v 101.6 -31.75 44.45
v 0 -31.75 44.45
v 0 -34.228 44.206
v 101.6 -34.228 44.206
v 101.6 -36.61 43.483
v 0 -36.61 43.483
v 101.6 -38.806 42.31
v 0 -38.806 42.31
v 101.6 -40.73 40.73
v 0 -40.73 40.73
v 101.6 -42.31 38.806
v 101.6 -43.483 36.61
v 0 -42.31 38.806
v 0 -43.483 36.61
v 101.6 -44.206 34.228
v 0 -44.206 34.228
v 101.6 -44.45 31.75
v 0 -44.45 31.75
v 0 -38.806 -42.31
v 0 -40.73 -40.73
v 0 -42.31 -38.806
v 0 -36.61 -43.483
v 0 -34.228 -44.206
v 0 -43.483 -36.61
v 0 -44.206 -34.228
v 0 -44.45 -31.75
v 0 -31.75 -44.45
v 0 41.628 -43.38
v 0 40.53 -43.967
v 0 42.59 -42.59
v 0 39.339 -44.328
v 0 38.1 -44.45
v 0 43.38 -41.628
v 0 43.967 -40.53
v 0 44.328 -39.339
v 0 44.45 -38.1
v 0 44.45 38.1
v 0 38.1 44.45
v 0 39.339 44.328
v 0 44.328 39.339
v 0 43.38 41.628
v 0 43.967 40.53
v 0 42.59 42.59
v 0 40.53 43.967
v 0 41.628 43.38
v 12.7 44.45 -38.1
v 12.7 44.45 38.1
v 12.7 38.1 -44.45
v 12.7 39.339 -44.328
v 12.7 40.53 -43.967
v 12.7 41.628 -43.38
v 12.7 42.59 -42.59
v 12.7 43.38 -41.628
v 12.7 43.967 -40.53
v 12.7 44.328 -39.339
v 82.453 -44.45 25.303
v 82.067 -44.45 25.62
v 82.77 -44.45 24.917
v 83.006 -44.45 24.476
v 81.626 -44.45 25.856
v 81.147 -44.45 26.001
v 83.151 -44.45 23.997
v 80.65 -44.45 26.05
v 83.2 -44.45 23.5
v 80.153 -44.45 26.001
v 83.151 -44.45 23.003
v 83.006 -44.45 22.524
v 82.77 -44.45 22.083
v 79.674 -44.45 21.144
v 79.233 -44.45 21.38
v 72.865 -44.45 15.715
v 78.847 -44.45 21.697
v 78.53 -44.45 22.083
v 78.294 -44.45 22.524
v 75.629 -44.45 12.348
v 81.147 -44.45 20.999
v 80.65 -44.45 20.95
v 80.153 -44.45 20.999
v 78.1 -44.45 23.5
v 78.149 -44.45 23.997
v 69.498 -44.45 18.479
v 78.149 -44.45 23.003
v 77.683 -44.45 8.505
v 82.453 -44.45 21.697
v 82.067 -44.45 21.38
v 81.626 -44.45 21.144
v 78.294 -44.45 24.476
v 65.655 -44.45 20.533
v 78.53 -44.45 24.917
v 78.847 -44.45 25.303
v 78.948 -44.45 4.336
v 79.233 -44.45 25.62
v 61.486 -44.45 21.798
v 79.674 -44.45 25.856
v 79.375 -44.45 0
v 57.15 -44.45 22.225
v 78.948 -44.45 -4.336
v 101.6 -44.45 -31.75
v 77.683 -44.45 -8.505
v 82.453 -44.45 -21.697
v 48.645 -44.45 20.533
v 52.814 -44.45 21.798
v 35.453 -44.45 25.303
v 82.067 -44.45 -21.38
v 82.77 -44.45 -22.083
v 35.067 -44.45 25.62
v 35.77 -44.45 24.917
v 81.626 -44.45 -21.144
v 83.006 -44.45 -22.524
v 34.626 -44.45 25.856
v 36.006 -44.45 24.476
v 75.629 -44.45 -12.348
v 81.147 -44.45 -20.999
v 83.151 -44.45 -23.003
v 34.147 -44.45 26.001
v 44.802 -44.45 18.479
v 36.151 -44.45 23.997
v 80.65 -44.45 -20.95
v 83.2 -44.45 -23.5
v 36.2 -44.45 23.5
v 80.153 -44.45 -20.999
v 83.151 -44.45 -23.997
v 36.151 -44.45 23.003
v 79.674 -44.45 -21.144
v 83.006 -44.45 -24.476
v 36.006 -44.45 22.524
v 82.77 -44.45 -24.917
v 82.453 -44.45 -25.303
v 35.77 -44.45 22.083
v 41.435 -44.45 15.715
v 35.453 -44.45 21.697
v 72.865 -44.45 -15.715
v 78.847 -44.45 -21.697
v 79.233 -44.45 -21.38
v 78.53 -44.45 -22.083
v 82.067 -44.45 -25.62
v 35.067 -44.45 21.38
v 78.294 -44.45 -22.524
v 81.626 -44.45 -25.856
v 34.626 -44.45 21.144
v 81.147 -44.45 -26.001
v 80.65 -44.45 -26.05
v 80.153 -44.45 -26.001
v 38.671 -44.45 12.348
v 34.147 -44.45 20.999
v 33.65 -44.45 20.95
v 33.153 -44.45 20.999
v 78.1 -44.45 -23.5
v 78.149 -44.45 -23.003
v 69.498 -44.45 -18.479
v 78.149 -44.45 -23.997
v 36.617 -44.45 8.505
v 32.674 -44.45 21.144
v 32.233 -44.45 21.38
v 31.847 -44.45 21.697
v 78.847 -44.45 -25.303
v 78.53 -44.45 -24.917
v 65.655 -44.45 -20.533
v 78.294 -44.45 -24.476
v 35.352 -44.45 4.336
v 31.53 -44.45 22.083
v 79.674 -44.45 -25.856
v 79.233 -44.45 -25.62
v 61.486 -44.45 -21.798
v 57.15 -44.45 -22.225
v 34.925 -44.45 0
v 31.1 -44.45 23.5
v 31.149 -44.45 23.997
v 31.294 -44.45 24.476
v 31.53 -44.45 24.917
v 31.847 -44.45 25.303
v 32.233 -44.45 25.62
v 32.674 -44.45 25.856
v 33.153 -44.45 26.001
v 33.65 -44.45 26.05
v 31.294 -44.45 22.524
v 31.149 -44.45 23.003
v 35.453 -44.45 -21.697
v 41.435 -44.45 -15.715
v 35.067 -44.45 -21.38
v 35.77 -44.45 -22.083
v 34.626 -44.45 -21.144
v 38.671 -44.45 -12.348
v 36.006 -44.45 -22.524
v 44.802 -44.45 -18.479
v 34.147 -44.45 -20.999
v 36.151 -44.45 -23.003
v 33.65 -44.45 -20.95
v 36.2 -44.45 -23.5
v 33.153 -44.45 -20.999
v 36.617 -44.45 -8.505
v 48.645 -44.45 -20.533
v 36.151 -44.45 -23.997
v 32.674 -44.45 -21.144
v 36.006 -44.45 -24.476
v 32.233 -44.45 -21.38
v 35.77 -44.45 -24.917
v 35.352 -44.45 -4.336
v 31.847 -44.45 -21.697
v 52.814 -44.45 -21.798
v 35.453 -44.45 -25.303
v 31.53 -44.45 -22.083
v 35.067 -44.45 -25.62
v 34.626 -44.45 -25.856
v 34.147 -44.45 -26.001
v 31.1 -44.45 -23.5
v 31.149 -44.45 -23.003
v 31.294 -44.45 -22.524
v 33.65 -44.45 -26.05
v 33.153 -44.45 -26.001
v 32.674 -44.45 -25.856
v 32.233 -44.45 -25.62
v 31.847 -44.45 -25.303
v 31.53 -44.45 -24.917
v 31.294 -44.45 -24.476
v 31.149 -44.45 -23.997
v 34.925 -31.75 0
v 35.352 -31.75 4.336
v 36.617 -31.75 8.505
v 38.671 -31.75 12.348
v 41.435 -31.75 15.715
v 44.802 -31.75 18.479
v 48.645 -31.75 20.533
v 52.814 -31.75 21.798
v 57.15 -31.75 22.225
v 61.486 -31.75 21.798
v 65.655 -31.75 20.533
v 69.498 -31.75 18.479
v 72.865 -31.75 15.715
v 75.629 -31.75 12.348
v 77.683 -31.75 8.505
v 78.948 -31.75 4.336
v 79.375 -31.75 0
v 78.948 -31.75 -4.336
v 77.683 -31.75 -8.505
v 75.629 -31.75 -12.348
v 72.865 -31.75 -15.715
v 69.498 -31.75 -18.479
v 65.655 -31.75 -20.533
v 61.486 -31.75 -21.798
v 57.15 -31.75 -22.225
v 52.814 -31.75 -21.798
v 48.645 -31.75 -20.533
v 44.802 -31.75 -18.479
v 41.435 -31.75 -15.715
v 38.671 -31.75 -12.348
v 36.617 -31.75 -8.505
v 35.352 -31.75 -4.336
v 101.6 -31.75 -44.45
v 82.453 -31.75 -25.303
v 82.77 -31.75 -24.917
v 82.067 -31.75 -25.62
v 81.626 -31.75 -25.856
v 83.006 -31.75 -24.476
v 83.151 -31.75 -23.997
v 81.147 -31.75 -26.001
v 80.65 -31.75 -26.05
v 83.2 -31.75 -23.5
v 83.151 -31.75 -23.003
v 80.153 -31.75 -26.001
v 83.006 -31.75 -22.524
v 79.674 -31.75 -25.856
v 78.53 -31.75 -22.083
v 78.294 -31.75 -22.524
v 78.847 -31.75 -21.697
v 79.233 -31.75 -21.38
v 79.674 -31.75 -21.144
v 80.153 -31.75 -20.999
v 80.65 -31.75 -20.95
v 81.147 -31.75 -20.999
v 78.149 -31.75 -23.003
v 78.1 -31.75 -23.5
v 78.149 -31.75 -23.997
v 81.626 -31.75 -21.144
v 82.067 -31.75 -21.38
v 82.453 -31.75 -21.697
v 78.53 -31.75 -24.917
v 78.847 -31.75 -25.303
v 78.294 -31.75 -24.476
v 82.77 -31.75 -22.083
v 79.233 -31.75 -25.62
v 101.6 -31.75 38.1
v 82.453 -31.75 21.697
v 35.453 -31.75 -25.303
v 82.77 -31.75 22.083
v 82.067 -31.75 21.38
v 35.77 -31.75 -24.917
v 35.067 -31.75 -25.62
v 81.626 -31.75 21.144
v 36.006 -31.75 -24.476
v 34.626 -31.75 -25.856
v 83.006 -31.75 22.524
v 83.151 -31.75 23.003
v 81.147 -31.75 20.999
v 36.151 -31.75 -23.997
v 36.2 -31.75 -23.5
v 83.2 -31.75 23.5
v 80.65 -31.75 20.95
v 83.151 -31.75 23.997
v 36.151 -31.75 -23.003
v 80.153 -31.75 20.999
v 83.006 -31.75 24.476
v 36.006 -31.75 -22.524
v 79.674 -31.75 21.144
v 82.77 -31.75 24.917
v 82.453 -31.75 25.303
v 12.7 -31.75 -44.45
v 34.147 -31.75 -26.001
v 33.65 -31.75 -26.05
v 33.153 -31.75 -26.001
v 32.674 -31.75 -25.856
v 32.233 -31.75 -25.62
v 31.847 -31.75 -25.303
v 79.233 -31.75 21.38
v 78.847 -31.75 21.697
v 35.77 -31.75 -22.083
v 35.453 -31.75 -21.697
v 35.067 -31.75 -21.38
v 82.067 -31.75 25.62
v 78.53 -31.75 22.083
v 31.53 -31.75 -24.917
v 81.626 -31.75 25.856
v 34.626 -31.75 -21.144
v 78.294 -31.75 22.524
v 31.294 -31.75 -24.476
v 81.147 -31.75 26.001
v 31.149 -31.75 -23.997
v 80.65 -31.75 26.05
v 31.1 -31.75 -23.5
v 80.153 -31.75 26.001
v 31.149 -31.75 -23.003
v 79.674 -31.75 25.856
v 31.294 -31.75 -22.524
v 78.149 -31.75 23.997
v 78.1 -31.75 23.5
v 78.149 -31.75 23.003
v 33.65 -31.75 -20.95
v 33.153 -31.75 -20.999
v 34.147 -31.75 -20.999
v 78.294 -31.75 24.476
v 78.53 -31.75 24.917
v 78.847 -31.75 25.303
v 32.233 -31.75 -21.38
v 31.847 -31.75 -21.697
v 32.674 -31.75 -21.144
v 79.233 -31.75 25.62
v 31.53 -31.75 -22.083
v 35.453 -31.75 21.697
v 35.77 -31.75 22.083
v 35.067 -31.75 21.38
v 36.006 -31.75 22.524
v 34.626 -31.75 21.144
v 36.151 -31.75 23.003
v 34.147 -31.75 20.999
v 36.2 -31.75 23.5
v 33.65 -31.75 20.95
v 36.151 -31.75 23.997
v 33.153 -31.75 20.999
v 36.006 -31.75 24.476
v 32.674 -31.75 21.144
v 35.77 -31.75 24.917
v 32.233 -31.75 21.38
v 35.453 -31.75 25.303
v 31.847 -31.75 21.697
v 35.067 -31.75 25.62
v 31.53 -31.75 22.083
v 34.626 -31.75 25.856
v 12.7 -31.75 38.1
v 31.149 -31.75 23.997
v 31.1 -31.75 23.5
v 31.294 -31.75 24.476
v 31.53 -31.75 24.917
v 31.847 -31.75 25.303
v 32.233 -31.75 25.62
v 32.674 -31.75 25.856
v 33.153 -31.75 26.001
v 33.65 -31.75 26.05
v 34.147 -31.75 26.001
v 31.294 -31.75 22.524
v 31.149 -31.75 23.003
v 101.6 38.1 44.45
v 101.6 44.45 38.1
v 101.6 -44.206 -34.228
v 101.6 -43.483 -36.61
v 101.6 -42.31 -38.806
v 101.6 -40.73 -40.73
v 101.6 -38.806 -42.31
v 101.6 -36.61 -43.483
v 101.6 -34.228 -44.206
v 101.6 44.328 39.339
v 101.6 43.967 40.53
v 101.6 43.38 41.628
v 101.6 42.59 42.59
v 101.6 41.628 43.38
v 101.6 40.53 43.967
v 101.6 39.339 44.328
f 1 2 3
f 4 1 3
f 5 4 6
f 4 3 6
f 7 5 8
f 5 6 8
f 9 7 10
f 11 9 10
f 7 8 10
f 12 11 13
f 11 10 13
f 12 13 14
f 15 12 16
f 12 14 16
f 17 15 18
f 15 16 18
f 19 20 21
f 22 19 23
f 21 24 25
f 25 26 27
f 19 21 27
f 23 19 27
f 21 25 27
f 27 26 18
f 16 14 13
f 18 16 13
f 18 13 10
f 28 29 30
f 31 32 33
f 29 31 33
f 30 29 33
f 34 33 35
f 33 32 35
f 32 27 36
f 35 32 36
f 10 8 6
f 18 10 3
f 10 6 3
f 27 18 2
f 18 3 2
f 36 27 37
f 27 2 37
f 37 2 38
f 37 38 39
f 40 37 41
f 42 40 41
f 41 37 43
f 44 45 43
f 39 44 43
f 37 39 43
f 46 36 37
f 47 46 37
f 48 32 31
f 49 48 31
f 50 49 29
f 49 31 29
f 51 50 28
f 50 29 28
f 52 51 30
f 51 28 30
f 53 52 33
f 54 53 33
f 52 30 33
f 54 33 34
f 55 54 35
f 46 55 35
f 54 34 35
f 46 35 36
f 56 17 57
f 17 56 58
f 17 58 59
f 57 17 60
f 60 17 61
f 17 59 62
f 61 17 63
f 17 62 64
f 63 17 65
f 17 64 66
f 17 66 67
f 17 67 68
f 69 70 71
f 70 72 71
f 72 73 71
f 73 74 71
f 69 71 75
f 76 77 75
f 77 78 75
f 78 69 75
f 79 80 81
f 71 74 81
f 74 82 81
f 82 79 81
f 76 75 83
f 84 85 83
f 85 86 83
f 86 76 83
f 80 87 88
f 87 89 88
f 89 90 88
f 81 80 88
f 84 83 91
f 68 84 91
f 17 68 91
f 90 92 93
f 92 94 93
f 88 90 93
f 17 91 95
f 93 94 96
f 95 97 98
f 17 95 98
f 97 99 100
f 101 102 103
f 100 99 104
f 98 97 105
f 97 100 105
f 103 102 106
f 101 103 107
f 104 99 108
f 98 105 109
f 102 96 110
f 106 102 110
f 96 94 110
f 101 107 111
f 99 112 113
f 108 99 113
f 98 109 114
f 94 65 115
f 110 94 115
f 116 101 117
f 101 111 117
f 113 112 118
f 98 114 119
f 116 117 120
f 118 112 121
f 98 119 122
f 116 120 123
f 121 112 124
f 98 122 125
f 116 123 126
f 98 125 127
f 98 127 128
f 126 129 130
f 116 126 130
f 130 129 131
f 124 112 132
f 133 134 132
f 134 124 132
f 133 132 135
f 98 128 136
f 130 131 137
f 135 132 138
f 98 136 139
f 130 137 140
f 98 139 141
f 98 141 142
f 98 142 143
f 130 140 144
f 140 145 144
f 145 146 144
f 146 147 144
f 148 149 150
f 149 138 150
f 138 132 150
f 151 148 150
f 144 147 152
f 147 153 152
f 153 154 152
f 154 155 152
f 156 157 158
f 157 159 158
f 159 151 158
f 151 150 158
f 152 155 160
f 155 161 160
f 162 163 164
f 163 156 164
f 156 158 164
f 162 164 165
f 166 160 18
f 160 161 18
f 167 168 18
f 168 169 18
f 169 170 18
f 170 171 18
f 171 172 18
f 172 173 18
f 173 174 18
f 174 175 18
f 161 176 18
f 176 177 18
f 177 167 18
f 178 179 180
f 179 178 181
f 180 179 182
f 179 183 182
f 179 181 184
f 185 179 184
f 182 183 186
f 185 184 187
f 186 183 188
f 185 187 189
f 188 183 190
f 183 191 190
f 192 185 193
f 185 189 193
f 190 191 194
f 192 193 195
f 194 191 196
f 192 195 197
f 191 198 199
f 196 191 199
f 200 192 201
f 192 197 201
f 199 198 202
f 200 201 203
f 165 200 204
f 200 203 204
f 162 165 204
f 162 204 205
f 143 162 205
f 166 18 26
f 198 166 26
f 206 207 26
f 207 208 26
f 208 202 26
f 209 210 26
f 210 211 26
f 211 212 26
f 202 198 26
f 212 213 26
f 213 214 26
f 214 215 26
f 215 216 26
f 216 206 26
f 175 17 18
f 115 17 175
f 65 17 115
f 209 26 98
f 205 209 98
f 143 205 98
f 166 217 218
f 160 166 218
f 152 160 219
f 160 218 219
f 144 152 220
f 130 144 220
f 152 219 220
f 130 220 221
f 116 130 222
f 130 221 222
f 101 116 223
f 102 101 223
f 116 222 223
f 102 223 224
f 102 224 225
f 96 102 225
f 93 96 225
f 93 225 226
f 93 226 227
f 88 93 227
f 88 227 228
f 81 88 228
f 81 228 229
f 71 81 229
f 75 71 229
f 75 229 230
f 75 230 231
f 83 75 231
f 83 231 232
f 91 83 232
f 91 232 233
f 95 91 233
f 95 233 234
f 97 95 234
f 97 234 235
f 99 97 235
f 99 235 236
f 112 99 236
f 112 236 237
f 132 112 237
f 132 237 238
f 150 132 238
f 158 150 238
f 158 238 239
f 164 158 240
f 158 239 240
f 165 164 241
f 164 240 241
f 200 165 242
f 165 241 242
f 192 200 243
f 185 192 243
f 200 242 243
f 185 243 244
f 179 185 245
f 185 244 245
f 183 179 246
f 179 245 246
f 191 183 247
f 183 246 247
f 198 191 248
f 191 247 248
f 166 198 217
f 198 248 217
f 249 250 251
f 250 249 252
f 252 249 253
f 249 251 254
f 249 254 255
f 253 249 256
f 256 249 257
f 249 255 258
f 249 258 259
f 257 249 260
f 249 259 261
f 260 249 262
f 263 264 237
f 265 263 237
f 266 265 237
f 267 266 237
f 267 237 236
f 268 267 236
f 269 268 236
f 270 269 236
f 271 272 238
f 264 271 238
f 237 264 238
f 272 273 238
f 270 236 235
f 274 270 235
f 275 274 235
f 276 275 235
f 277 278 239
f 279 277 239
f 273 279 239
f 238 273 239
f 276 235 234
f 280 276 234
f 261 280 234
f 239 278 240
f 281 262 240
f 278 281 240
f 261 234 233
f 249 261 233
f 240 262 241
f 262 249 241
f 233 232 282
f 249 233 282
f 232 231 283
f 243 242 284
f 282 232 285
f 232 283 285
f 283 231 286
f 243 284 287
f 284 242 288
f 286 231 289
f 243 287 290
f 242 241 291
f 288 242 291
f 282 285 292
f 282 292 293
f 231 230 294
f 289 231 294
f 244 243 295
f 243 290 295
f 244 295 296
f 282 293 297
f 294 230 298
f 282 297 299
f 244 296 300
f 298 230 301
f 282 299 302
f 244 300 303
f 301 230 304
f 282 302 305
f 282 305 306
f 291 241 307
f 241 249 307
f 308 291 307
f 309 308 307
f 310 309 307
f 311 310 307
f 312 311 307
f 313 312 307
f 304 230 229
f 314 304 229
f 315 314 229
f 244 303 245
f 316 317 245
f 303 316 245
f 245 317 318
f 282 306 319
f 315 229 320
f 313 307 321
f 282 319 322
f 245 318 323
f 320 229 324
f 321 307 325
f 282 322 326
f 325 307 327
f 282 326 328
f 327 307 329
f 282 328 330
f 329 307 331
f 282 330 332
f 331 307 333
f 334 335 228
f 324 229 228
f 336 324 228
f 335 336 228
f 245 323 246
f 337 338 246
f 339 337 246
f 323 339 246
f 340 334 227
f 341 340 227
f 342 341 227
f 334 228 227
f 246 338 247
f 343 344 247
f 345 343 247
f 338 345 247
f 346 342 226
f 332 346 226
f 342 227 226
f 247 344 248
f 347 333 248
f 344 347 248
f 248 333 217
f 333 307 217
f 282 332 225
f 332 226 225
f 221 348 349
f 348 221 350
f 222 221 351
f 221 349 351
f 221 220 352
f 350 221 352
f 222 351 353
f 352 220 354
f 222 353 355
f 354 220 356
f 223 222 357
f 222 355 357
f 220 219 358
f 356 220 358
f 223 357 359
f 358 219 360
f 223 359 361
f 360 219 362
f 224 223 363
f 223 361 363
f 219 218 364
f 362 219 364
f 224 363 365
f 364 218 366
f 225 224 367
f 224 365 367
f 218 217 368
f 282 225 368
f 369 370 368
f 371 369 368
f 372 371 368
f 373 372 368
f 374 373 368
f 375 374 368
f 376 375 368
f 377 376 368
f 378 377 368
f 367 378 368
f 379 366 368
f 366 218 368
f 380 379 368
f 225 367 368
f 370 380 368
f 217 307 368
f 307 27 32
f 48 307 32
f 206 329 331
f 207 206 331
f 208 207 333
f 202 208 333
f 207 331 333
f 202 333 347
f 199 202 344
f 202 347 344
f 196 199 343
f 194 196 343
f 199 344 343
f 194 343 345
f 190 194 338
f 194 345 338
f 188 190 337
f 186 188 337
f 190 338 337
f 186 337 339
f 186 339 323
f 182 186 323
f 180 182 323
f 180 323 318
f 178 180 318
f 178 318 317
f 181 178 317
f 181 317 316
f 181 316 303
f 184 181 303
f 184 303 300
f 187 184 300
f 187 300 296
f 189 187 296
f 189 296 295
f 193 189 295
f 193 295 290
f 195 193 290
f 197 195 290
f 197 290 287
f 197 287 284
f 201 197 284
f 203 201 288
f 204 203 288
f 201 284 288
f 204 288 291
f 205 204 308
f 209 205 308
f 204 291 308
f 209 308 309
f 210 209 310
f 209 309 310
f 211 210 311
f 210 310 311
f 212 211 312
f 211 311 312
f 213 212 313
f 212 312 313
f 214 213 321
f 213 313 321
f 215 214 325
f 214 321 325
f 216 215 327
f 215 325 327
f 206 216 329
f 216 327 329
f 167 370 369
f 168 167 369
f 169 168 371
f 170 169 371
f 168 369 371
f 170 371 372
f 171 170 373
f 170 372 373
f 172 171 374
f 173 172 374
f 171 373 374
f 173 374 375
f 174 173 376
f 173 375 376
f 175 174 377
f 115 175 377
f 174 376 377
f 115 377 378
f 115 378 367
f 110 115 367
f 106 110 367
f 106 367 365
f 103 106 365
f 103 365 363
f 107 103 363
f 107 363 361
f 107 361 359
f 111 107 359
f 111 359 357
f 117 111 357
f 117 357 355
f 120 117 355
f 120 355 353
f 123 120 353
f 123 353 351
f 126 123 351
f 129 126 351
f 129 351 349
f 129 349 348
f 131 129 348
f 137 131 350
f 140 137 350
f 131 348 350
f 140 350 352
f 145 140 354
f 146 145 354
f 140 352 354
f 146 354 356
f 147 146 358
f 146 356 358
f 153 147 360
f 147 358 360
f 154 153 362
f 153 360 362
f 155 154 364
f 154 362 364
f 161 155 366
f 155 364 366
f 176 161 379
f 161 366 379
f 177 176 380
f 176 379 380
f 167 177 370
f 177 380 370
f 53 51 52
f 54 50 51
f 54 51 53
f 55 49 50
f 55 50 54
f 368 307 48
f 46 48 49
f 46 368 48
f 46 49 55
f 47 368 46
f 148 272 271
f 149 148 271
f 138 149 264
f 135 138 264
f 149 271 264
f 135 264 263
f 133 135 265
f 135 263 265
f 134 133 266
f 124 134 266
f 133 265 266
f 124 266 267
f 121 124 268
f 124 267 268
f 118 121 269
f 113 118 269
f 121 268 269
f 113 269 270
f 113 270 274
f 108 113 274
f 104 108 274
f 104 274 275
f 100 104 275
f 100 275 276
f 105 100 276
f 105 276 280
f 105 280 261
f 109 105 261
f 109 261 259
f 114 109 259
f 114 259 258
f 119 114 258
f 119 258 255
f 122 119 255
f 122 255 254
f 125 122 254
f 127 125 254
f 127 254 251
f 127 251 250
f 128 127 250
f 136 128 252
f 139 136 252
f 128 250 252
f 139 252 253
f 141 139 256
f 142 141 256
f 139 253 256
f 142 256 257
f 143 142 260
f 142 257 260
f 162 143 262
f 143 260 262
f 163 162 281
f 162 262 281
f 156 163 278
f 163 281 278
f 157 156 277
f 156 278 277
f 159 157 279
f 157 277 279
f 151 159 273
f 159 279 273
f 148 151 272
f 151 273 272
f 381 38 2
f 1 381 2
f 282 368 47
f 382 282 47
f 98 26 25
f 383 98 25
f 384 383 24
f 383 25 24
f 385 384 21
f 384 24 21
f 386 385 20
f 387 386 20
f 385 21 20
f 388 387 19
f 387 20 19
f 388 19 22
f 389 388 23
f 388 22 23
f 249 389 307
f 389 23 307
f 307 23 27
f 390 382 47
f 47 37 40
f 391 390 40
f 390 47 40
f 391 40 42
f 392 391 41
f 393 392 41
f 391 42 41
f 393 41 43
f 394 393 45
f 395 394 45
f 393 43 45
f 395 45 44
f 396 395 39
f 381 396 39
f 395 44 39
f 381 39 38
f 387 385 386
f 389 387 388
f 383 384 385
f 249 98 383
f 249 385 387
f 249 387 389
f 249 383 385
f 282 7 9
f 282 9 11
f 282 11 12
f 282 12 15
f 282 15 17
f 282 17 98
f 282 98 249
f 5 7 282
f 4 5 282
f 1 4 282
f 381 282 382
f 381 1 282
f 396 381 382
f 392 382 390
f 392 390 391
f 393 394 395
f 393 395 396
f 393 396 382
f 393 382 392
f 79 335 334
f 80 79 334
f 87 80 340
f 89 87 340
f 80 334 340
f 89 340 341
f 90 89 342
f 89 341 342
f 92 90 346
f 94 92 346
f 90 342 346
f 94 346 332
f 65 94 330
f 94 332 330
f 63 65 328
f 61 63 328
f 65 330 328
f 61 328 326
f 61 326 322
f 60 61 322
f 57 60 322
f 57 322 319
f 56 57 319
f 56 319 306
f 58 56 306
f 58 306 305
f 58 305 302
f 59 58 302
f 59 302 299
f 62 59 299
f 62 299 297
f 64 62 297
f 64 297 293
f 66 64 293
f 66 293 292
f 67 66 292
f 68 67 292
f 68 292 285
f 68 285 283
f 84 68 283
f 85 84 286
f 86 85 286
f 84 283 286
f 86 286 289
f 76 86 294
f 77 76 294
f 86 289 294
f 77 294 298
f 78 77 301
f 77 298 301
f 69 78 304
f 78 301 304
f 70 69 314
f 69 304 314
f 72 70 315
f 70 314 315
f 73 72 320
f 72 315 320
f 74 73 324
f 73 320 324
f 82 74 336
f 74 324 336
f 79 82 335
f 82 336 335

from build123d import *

# Parameters (mm, degrees)
F1_DEPTH = 101.6
F2_DEPTH = 12.7
F3_R     = 22.225
F3_R_2   = 2.55
F4_DEPTH = 12.701
F5_DEPTH = 101.6


with BuildPart() as f1:
    # F0 (on Right) → F1 (new body)
    with BuildSketch(Plane.YZ):
        with BuildLine():
            ThreePointArc((-44.45, -31.75), (-40.730256, -40.730256), (-31.75, -44.45))
            Line((-31.75, -44.45), (-31.75, 38.1))
            Line((-31.75, 38.1), (-31.75, 44.45))
            ThreePointArc((-31.75, 44.45), (-40.730256, 40.730256), (-44.45, 31.75))
            Line((-44.45, 31.75), (-44.45, -31.75))
        make_face()
    extrude(amount=F1_DEPTH)

    # F0 (on Right) → F2 (join)
    with BuildSketch(Plane.YZ):
        with BuildLine():
            Line((-31.75, -44.45), (38.1, -44.45))
            ThreePointArc((38.1, -44.45), (42.590128, -42.590128), (44.45, -38.1))
            Line((44.45, -38.1), (44.45, 38.1))
            Line((44.45, 38.1), (-31.75, 38.1))
            Line((-31.75, 38.1), (-31.75, -44.45))
        make_face()
    extrude(amount=F2_DEPTH)

    # F3 (on face) → F4 (cut, through all)
    with BuildSketch(Plane(origin=(0, -31.75, 0), x_dir=(-1, 0, 0), z_dir=(0, 1, 0))):
        with Locations((-57.15, 0)):
            Circle(F3_R)
        with Locations((-33.65, -23.5)):
            Circle(F3_R_2)
        with Locations((-80.65, -23.5)):
            Circle(F3_R_2)
        with Locations((-80.65, 23.5)):
            Circle(F3_R_2)
        with Locations((-33.65, 23.5)):
            Circle(F3_R_2)
    extrude(amount=-F4_DEPTH, mode=Mode.SUBTRACT)

    # F0 (on Right) → F5 (join)
    with BuildSketch(Plane.YZ):
        with BuildLine():
            Line((-31.75, 44.45), (-31.75, 38.1))
            Line((-31.75, 38.1), (44.45, 38.1))
            ThreePointArc((44.45, 38.1), (42.590128, 42.590128), (38.1, 44.45))
            Line((38.1, 44.45), (-31.75, 44.45))
        make_face()
    extrude(amount=F5_DEPTH)


solid = f1.part
